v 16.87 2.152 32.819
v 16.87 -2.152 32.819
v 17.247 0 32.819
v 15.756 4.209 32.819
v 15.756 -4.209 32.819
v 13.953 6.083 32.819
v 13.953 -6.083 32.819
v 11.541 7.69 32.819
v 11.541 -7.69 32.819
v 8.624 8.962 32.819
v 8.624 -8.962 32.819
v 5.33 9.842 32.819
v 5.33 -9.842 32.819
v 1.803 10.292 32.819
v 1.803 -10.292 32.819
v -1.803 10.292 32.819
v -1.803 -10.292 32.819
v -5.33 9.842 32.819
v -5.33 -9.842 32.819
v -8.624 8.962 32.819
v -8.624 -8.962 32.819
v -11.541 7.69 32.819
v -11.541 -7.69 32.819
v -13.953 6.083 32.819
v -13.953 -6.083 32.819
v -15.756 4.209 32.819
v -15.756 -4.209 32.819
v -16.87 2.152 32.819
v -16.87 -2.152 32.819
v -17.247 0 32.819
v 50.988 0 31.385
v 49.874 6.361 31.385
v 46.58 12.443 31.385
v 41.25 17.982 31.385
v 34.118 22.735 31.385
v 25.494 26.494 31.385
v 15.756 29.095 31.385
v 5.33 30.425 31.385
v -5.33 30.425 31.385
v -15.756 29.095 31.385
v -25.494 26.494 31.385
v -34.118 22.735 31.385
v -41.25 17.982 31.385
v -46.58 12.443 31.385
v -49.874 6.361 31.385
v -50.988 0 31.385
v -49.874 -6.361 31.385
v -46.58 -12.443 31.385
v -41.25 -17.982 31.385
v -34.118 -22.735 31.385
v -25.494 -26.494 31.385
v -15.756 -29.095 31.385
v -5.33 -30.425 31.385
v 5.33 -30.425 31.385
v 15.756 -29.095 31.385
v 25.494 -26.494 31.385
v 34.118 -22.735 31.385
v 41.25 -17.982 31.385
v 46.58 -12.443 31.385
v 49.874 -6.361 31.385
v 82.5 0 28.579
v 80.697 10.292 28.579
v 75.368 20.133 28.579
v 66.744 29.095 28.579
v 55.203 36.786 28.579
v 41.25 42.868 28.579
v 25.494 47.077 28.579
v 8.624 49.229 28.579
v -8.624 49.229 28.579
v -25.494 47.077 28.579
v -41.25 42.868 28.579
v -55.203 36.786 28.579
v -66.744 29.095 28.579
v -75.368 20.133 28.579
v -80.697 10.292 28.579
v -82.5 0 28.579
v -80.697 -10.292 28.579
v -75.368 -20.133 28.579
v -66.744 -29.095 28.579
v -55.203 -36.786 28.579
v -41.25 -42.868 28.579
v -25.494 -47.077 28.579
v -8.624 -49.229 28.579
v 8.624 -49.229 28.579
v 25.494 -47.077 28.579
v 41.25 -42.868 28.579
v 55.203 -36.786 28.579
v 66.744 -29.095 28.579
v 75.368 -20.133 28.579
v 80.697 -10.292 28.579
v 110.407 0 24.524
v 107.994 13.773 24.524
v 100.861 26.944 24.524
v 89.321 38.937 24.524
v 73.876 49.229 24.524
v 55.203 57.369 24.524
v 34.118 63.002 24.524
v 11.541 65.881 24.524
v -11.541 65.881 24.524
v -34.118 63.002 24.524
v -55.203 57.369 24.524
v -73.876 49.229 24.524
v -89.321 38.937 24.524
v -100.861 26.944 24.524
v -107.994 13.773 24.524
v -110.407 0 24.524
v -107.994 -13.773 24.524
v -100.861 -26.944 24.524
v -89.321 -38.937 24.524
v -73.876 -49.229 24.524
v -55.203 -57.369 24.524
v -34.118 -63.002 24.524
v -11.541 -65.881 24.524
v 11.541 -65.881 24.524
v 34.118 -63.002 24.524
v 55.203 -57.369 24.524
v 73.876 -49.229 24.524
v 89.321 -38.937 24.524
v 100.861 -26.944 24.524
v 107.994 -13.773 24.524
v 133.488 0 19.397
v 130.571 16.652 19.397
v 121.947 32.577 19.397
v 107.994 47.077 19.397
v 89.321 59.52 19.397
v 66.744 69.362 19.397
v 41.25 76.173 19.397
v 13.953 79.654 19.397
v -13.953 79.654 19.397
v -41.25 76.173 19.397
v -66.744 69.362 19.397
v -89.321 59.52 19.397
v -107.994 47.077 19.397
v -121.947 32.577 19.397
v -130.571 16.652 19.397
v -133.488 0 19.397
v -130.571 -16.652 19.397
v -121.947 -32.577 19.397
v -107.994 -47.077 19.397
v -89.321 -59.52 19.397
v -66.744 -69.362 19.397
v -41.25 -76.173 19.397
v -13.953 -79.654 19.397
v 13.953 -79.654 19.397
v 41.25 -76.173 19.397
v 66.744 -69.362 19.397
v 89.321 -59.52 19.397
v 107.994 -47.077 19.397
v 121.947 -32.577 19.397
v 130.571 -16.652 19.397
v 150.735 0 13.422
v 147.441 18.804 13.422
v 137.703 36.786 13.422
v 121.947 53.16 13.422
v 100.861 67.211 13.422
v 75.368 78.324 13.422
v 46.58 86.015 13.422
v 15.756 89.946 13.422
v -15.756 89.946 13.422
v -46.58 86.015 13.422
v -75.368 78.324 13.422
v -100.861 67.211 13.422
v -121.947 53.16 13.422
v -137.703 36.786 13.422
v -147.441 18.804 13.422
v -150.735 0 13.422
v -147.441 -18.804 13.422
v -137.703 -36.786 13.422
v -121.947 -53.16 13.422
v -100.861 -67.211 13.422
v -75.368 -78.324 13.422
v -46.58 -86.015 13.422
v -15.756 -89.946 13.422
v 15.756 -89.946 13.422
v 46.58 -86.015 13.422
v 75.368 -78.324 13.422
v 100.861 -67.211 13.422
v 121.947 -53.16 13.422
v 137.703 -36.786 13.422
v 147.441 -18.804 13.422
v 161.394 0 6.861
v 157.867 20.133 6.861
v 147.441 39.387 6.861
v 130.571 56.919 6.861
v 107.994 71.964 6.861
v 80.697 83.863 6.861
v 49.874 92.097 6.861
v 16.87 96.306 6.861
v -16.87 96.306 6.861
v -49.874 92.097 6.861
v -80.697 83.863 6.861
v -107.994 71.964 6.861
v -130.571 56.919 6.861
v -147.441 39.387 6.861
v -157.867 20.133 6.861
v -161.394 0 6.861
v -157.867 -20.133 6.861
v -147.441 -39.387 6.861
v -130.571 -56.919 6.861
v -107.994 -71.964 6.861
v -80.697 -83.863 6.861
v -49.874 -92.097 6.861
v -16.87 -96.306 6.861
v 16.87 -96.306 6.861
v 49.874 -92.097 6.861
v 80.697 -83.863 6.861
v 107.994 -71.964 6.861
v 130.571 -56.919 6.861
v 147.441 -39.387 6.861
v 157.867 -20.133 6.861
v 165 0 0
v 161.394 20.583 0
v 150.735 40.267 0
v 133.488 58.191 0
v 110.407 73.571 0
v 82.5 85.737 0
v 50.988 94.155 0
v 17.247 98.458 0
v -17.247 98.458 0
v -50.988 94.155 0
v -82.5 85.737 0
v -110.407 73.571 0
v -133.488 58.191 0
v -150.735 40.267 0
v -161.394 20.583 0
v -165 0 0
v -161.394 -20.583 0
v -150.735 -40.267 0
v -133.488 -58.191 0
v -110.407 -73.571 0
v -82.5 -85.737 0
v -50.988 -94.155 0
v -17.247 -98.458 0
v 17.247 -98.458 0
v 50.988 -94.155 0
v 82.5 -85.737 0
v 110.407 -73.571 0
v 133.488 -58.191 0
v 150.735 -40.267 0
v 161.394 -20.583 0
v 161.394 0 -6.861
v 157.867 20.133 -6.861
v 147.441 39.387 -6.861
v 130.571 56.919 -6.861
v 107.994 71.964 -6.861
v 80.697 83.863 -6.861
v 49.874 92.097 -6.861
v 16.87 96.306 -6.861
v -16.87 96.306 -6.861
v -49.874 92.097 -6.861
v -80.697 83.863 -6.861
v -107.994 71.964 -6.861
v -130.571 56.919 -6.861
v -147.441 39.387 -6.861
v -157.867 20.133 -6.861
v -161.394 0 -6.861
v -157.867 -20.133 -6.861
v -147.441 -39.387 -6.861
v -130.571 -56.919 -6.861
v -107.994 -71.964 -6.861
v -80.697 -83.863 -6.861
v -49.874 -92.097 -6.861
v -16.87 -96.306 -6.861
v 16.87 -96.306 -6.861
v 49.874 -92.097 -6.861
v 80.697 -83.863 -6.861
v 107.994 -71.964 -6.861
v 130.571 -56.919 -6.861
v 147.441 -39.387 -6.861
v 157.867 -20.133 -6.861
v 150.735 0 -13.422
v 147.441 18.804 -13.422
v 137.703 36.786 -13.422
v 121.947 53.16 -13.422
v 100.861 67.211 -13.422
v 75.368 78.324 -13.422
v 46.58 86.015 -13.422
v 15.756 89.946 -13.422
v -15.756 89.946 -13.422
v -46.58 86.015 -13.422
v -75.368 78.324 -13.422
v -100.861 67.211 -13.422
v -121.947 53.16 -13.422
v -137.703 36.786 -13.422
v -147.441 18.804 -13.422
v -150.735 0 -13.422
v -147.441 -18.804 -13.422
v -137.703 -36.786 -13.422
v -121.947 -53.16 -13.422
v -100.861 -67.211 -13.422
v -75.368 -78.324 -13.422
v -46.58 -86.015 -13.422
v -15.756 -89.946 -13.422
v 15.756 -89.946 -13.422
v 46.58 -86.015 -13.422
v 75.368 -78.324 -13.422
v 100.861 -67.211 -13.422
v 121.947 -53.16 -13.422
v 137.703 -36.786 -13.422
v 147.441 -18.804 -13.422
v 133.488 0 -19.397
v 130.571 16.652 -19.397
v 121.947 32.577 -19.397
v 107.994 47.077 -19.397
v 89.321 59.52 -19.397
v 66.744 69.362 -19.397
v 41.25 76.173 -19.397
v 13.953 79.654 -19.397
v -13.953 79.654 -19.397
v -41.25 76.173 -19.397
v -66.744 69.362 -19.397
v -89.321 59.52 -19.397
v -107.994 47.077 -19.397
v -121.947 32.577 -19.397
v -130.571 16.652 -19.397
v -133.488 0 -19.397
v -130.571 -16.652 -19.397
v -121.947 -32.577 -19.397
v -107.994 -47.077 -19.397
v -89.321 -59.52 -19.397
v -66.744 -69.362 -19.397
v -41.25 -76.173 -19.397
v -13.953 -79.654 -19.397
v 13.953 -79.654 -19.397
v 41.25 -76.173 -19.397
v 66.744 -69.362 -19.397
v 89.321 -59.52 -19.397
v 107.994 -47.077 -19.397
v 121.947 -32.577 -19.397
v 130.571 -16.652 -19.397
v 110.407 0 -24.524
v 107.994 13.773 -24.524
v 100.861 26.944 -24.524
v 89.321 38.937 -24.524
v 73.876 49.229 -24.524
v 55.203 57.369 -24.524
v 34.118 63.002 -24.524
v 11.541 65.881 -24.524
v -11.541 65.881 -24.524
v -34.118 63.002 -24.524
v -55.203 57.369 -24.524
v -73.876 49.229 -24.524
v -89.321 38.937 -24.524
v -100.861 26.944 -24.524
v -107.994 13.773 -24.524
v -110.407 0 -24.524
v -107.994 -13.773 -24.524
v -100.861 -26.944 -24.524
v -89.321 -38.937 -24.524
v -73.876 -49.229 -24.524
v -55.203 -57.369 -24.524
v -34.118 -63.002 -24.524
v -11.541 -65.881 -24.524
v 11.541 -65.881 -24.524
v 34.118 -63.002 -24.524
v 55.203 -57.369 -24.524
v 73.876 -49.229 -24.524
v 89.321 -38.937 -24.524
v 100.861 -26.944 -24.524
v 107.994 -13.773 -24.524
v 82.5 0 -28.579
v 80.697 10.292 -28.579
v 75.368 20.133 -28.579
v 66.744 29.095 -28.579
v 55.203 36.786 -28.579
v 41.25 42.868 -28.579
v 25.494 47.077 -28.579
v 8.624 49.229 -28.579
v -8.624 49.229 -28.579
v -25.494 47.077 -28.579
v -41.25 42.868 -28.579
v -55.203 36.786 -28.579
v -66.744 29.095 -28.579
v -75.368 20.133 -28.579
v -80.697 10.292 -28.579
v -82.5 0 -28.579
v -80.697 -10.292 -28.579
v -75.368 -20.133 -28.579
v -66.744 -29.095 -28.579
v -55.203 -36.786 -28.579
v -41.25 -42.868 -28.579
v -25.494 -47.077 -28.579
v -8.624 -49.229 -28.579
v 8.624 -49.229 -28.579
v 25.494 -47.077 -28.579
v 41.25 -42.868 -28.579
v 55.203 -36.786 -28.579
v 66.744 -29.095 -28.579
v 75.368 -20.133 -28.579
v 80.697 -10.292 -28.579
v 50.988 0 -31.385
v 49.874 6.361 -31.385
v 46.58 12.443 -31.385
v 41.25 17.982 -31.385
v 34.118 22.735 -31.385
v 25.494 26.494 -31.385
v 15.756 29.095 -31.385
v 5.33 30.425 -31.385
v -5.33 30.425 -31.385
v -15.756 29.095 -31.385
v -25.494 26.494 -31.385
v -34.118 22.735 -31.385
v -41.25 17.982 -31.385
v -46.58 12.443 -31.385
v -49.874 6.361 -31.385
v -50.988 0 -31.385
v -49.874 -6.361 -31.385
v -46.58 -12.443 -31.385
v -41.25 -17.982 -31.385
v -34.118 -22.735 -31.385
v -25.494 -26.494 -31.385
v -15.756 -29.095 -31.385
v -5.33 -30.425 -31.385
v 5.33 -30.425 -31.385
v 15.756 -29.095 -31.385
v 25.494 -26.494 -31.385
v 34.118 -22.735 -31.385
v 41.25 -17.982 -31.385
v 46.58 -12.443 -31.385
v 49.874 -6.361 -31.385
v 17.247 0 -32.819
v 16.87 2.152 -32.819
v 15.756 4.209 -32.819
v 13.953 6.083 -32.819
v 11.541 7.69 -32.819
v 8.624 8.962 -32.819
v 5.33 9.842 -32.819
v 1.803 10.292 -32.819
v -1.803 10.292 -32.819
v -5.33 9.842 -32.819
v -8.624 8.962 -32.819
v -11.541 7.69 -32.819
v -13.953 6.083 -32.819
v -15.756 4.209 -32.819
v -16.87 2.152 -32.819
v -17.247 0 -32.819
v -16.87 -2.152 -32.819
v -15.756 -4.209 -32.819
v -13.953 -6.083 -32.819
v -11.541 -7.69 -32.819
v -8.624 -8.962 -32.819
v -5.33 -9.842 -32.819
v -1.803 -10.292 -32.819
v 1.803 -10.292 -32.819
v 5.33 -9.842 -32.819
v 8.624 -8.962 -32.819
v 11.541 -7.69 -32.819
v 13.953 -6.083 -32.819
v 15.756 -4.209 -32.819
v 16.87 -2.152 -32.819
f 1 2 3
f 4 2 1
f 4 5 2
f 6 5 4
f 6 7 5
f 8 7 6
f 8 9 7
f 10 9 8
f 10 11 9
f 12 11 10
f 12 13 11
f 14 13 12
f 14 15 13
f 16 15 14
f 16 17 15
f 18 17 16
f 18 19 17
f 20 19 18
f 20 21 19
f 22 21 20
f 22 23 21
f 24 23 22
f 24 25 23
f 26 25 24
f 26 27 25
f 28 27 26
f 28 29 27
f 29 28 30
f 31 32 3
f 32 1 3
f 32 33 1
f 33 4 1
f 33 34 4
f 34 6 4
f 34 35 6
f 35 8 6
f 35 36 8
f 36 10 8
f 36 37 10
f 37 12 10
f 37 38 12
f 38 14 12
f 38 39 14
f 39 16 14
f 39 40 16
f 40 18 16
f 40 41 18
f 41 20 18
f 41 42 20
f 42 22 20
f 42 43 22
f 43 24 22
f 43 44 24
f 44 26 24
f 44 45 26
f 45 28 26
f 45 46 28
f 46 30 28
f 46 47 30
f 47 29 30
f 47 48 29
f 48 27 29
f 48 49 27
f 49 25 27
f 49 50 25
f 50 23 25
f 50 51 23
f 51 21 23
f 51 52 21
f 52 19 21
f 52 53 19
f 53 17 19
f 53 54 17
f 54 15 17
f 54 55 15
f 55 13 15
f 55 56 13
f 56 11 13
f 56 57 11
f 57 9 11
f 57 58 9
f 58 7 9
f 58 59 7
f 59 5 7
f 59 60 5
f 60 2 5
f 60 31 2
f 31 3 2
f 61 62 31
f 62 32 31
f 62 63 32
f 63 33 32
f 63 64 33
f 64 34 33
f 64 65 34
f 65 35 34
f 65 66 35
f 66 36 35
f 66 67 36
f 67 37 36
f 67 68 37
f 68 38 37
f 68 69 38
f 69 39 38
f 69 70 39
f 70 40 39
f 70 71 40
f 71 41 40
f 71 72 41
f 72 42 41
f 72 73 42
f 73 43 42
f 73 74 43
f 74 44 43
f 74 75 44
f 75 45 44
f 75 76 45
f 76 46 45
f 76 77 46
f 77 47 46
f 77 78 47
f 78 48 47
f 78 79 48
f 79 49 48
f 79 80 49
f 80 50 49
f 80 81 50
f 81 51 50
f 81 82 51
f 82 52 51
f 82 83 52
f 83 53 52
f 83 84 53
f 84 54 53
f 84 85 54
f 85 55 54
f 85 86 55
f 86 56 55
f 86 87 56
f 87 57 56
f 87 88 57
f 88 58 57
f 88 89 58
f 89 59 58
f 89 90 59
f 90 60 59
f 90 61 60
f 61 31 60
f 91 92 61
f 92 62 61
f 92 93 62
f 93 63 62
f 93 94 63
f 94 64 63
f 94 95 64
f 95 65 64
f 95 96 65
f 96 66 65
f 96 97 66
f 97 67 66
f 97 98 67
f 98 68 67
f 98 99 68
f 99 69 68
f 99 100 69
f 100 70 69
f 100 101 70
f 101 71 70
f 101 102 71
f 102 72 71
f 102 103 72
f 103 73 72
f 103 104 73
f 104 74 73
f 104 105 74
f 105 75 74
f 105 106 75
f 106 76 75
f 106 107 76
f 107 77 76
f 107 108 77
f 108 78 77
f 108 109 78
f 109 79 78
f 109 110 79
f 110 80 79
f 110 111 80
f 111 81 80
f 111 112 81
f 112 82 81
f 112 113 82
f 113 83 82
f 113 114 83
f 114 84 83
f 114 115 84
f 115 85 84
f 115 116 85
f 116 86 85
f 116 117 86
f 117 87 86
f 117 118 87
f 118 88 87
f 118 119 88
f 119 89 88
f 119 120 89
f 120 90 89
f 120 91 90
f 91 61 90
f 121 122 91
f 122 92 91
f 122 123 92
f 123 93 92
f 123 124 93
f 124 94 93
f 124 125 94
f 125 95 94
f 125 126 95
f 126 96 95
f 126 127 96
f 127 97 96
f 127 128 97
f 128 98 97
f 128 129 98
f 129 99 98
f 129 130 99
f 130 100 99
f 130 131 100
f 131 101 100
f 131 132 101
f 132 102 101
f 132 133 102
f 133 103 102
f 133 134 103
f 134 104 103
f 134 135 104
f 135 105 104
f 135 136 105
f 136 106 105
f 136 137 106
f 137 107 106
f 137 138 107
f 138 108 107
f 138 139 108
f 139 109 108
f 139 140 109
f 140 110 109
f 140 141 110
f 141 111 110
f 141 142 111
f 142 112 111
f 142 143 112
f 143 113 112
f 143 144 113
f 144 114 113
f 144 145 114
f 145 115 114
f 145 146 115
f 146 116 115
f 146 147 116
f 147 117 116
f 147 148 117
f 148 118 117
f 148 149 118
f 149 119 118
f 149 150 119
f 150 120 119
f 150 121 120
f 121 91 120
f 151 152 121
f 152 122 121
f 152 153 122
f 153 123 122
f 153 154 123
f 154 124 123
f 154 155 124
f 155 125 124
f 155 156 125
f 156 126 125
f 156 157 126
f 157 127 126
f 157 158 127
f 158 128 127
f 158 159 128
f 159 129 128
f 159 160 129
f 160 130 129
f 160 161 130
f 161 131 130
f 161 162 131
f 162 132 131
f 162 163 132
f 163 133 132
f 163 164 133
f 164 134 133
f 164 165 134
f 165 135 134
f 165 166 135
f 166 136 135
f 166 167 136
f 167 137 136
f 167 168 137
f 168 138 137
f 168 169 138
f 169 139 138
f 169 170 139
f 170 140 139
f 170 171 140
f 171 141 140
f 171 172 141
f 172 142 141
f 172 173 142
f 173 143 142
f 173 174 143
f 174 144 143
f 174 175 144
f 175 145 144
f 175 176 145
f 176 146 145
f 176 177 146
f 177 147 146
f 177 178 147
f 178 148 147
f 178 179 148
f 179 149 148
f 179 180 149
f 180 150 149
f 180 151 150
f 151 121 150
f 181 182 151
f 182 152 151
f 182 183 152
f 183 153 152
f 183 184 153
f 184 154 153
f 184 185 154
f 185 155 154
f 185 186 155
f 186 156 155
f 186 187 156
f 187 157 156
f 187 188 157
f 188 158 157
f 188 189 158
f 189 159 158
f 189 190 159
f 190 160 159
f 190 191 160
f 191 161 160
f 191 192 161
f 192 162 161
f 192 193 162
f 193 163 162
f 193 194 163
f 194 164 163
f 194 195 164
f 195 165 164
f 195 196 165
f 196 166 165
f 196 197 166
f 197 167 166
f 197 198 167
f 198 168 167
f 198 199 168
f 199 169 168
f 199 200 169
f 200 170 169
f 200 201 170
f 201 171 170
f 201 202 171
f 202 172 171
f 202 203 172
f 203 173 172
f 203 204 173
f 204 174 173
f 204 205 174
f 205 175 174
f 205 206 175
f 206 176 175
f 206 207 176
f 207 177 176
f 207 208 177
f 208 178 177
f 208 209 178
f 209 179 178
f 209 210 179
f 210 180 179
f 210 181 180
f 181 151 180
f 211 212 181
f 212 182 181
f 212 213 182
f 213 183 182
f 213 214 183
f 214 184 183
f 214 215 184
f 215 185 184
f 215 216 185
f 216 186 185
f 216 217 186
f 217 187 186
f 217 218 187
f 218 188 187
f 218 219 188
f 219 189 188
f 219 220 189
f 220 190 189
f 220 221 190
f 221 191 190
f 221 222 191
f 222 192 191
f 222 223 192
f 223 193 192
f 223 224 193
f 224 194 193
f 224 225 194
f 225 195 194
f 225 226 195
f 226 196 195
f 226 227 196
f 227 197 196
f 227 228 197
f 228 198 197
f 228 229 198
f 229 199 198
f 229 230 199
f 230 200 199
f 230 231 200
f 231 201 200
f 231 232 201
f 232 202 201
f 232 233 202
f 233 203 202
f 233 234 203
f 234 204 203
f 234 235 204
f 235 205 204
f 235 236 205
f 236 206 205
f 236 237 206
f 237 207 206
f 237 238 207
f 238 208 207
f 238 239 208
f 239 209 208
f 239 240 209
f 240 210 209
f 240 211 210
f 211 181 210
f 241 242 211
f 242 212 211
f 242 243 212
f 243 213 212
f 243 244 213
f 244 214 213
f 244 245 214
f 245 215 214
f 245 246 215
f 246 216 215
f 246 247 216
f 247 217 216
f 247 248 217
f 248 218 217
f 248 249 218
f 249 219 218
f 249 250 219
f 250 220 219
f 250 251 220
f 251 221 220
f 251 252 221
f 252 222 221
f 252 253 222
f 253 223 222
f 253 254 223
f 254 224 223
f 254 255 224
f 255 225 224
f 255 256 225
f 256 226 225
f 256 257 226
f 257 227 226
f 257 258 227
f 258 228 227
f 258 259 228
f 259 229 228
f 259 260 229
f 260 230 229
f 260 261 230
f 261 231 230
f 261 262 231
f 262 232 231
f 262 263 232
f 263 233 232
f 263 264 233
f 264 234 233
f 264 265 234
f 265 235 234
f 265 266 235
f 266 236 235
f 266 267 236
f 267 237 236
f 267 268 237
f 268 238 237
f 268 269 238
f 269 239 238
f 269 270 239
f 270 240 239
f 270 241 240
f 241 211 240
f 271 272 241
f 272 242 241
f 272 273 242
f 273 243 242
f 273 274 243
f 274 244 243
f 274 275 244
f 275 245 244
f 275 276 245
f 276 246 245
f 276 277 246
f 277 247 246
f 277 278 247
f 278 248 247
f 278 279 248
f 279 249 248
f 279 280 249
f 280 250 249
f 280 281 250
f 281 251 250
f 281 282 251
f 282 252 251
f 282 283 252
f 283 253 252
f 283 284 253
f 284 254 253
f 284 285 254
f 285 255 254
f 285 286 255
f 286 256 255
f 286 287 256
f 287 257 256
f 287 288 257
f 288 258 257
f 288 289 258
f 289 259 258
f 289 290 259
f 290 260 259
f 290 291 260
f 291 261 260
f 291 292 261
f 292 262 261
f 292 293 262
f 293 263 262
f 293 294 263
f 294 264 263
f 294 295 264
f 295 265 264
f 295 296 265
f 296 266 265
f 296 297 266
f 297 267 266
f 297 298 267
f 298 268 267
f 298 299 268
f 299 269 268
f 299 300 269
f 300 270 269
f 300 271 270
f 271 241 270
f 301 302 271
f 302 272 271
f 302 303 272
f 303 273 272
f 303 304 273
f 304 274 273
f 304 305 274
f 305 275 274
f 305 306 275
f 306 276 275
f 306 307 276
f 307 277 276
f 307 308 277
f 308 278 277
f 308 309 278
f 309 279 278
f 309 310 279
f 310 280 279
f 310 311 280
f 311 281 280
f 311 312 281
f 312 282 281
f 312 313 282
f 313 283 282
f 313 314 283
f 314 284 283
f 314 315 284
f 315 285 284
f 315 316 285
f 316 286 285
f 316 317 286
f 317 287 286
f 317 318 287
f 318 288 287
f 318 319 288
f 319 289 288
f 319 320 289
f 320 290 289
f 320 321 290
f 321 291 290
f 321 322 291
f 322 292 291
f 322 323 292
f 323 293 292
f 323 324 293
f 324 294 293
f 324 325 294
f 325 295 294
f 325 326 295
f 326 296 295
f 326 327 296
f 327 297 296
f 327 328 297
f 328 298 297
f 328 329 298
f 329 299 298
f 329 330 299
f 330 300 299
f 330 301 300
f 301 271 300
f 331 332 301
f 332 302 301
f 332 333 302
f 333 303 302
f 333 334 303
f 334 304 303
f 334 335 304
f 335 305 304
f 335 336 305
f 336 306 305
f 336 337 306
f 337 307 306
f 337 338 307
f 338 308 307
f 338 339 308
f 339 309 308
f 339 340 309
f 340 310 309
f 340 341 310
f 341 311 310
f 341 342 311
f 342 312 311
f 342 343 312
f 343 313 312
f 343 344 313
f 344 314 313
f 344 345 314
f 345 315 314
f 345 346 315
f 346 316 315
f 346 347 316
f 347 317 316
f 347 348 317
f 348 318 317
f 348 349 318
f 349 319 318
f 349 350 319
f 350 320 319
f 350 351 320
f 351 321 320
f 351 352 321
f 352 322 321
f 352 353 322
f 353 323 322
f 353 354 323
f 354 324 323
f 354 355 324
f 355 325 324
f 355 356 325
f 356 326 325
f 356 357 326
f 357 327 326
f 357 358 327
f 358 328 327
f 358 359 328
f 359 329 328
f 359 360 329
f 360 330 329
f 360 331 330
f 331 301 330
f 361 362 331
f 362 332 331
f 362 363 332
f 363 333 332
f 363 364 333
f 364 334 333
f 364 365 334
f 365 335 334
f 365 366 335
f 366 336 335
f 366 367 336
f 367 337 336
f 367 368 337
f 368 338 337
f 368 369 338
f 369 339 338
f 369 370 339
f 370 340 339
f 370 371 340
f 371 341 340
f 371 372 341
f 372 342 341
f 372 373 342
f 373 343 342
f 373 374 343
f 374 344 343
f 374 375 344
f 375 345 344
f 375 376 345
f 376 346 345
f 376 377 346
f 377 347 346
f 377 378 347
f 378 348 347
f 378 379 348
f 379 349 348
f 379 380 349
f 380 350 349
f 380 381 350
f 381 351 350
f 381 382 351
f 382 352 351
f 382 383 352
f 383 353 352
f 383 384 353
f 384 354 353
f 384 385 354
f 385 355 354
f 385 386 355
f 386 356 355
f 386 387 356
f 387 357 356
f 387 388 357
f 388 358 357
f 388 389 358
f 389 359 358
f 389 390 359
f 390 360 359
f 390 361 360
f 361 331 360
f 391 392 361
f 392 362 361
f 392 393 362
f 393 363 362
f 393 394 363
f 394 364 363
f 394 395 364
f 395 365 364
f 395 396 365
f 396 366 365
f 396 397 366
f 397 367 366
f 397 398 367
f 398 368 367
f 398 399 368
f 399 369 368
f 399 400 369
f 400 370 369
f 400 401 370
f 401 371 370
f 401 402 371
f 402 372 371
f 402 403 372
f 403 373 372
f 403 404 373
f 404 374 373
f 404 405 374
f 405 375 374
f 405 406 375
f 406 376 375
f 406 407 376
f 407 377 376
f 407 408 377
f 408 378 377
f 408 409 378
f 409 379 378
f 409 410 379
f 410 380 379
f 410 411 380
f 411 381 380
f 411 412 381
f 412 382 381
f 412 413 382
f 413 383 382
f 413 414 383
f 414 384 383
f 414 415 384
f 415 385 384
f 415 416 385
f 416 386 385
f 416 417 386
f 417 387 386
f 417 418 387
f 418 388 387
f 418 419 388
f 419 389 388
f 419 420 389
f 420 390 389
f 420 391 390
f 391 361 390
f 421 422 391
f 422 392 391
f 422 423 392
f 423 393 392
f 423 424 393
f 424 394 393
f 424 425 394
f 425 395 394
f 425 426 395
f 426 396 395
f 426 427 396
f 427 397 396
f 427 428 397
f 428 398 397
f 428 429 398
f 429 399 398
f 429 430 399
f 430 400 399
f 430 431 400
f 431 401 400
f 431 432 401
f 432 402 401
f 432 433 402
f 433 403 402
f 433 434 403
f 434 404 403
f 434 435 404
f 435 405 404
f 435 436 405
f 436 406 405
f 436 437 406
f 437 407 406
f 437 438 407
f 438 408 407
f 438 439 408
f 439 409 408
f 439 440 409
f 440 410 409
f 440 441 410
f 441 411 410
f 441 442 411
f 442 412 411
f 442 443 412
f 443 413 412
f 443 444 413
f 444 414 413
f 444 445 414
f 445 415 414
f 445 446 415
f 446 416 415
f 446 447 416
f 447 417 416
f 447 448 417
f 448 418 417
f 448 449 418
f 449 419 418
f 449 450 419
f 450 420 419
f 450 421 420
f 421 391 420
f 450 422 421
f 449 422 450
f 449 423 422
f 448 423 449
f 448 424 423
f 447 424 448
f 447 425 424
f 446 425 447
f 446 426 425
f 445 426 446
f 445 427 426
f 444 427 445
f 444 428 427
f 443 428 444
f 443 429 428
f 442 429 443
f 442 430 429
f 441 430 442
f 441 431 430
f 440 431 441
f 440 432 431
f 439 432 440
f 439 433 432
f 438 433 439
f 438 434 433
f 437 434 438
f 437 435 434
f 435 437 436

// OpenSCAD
// Generated by SolidPython 1.0.1 on 2020-07-29 00:46:51


scale(v = [15, 9, 3]) {
	sphere(r = 11);
}
/***********************************************
*********      SolidPython code:      **********
************************************************
 
# import packages: SolidPython
from solid import *
from solid.utils import *
from itertools import chain, combinations, permutations


class Resize:

    def __init__(self, scad_file):
        self.scad_file = scad_file
        #self.scad_file = import_scad(scad_file)
        # cone/cylinder param:
        self.r1 = 0
        self.r2 = 0
        self.h = 0
        # rectangular prism param:
        self.w = 0
        self.l = 0
        # ellipse param:
        self.r = 0

    # import OpenScad code (file name corresponds to shape)


    # classify shape + parameters
    def assign(self, param1, param2, param3):
        if self.scad_file == 'cone.scad':
            self.r1 = param1
            self.r2 = param2
            self.h = param3
        elif self.scad_file == 'cylinder.scad':
            self.r1 = param1
            self.r2 = param2
            self.h = param3
        elif self.scad_file == 'rectangularPrism.scad':
            self.h = param1
            self.l = param2
            self.w = param3
        else:
            self.r = param1
            self.h = param2

    # resize parameters
    def iterate(self):
        x = range(3, 20, 2)
        i = 1
        if self.scad_file == 'cone.scad':
            tempList = list(permutations(x, 2))
            for temp in tempList:
                param1 = temp[0]
                param2 = temp[1]
                filepath = 'produced_scad_files/' + 'cone' + str(param1) + '_' + str(param2) + '_' + '.scad'
                scad_render_to_file(cylinder(h=param1, r1=param2, r2=0), filepath)

        elif self.scad_file == 'cylinder.scad':
            tempList = list(permutations(x, 3))
            for temp in tempList:
                param1 = temp[0]
                param2 = temp[1]
                filepath = 'produced_scad_files/' + 'cylinder' + str(param1) + '_' + str(param2) + '_' + '.scad'
                scad_render_to_file(cylinder(h=param1, r1=param2, r2=param2), filepath)

        elif self.scad_file == 'rectangularPrism.scad':
            tempList = list(permutations(x, 3))
            for temp in tempList:
                param1 = temp[0]
                param2 = temp[1]
                param3 = temp[2]
                filepath = 'produced_scad_files/' + 'rectangularPrism' + str(param1) + '_' + str(param2) + '_' + str(
                    param3) + '.scad'
                scad_render_to_file(cube(size=(param1, param2, param3)), filepath)

        elif self.scad_file == 'ellipse.scad':
            tempList = list(permutations(x, 4))
            for temp in tempList:
                param1 = temp[0]
                param2 = temp[1]
                param3 = temp[2]
                param4 = temp[3]
                filepath = 'produced_scad_files/' + 'ellipse' + str(param1) + '_' + str(param2) + '_' + str(param3) + '_' + str(param4) + '.scad'
                scad_render_to_file(scale([param1, param2, param3])(sphere(r=param4)), filepath)

    def render_to_scadfile(self):
        scad_render_to_file(scad, 'example.scad') 
 
************************************************/
